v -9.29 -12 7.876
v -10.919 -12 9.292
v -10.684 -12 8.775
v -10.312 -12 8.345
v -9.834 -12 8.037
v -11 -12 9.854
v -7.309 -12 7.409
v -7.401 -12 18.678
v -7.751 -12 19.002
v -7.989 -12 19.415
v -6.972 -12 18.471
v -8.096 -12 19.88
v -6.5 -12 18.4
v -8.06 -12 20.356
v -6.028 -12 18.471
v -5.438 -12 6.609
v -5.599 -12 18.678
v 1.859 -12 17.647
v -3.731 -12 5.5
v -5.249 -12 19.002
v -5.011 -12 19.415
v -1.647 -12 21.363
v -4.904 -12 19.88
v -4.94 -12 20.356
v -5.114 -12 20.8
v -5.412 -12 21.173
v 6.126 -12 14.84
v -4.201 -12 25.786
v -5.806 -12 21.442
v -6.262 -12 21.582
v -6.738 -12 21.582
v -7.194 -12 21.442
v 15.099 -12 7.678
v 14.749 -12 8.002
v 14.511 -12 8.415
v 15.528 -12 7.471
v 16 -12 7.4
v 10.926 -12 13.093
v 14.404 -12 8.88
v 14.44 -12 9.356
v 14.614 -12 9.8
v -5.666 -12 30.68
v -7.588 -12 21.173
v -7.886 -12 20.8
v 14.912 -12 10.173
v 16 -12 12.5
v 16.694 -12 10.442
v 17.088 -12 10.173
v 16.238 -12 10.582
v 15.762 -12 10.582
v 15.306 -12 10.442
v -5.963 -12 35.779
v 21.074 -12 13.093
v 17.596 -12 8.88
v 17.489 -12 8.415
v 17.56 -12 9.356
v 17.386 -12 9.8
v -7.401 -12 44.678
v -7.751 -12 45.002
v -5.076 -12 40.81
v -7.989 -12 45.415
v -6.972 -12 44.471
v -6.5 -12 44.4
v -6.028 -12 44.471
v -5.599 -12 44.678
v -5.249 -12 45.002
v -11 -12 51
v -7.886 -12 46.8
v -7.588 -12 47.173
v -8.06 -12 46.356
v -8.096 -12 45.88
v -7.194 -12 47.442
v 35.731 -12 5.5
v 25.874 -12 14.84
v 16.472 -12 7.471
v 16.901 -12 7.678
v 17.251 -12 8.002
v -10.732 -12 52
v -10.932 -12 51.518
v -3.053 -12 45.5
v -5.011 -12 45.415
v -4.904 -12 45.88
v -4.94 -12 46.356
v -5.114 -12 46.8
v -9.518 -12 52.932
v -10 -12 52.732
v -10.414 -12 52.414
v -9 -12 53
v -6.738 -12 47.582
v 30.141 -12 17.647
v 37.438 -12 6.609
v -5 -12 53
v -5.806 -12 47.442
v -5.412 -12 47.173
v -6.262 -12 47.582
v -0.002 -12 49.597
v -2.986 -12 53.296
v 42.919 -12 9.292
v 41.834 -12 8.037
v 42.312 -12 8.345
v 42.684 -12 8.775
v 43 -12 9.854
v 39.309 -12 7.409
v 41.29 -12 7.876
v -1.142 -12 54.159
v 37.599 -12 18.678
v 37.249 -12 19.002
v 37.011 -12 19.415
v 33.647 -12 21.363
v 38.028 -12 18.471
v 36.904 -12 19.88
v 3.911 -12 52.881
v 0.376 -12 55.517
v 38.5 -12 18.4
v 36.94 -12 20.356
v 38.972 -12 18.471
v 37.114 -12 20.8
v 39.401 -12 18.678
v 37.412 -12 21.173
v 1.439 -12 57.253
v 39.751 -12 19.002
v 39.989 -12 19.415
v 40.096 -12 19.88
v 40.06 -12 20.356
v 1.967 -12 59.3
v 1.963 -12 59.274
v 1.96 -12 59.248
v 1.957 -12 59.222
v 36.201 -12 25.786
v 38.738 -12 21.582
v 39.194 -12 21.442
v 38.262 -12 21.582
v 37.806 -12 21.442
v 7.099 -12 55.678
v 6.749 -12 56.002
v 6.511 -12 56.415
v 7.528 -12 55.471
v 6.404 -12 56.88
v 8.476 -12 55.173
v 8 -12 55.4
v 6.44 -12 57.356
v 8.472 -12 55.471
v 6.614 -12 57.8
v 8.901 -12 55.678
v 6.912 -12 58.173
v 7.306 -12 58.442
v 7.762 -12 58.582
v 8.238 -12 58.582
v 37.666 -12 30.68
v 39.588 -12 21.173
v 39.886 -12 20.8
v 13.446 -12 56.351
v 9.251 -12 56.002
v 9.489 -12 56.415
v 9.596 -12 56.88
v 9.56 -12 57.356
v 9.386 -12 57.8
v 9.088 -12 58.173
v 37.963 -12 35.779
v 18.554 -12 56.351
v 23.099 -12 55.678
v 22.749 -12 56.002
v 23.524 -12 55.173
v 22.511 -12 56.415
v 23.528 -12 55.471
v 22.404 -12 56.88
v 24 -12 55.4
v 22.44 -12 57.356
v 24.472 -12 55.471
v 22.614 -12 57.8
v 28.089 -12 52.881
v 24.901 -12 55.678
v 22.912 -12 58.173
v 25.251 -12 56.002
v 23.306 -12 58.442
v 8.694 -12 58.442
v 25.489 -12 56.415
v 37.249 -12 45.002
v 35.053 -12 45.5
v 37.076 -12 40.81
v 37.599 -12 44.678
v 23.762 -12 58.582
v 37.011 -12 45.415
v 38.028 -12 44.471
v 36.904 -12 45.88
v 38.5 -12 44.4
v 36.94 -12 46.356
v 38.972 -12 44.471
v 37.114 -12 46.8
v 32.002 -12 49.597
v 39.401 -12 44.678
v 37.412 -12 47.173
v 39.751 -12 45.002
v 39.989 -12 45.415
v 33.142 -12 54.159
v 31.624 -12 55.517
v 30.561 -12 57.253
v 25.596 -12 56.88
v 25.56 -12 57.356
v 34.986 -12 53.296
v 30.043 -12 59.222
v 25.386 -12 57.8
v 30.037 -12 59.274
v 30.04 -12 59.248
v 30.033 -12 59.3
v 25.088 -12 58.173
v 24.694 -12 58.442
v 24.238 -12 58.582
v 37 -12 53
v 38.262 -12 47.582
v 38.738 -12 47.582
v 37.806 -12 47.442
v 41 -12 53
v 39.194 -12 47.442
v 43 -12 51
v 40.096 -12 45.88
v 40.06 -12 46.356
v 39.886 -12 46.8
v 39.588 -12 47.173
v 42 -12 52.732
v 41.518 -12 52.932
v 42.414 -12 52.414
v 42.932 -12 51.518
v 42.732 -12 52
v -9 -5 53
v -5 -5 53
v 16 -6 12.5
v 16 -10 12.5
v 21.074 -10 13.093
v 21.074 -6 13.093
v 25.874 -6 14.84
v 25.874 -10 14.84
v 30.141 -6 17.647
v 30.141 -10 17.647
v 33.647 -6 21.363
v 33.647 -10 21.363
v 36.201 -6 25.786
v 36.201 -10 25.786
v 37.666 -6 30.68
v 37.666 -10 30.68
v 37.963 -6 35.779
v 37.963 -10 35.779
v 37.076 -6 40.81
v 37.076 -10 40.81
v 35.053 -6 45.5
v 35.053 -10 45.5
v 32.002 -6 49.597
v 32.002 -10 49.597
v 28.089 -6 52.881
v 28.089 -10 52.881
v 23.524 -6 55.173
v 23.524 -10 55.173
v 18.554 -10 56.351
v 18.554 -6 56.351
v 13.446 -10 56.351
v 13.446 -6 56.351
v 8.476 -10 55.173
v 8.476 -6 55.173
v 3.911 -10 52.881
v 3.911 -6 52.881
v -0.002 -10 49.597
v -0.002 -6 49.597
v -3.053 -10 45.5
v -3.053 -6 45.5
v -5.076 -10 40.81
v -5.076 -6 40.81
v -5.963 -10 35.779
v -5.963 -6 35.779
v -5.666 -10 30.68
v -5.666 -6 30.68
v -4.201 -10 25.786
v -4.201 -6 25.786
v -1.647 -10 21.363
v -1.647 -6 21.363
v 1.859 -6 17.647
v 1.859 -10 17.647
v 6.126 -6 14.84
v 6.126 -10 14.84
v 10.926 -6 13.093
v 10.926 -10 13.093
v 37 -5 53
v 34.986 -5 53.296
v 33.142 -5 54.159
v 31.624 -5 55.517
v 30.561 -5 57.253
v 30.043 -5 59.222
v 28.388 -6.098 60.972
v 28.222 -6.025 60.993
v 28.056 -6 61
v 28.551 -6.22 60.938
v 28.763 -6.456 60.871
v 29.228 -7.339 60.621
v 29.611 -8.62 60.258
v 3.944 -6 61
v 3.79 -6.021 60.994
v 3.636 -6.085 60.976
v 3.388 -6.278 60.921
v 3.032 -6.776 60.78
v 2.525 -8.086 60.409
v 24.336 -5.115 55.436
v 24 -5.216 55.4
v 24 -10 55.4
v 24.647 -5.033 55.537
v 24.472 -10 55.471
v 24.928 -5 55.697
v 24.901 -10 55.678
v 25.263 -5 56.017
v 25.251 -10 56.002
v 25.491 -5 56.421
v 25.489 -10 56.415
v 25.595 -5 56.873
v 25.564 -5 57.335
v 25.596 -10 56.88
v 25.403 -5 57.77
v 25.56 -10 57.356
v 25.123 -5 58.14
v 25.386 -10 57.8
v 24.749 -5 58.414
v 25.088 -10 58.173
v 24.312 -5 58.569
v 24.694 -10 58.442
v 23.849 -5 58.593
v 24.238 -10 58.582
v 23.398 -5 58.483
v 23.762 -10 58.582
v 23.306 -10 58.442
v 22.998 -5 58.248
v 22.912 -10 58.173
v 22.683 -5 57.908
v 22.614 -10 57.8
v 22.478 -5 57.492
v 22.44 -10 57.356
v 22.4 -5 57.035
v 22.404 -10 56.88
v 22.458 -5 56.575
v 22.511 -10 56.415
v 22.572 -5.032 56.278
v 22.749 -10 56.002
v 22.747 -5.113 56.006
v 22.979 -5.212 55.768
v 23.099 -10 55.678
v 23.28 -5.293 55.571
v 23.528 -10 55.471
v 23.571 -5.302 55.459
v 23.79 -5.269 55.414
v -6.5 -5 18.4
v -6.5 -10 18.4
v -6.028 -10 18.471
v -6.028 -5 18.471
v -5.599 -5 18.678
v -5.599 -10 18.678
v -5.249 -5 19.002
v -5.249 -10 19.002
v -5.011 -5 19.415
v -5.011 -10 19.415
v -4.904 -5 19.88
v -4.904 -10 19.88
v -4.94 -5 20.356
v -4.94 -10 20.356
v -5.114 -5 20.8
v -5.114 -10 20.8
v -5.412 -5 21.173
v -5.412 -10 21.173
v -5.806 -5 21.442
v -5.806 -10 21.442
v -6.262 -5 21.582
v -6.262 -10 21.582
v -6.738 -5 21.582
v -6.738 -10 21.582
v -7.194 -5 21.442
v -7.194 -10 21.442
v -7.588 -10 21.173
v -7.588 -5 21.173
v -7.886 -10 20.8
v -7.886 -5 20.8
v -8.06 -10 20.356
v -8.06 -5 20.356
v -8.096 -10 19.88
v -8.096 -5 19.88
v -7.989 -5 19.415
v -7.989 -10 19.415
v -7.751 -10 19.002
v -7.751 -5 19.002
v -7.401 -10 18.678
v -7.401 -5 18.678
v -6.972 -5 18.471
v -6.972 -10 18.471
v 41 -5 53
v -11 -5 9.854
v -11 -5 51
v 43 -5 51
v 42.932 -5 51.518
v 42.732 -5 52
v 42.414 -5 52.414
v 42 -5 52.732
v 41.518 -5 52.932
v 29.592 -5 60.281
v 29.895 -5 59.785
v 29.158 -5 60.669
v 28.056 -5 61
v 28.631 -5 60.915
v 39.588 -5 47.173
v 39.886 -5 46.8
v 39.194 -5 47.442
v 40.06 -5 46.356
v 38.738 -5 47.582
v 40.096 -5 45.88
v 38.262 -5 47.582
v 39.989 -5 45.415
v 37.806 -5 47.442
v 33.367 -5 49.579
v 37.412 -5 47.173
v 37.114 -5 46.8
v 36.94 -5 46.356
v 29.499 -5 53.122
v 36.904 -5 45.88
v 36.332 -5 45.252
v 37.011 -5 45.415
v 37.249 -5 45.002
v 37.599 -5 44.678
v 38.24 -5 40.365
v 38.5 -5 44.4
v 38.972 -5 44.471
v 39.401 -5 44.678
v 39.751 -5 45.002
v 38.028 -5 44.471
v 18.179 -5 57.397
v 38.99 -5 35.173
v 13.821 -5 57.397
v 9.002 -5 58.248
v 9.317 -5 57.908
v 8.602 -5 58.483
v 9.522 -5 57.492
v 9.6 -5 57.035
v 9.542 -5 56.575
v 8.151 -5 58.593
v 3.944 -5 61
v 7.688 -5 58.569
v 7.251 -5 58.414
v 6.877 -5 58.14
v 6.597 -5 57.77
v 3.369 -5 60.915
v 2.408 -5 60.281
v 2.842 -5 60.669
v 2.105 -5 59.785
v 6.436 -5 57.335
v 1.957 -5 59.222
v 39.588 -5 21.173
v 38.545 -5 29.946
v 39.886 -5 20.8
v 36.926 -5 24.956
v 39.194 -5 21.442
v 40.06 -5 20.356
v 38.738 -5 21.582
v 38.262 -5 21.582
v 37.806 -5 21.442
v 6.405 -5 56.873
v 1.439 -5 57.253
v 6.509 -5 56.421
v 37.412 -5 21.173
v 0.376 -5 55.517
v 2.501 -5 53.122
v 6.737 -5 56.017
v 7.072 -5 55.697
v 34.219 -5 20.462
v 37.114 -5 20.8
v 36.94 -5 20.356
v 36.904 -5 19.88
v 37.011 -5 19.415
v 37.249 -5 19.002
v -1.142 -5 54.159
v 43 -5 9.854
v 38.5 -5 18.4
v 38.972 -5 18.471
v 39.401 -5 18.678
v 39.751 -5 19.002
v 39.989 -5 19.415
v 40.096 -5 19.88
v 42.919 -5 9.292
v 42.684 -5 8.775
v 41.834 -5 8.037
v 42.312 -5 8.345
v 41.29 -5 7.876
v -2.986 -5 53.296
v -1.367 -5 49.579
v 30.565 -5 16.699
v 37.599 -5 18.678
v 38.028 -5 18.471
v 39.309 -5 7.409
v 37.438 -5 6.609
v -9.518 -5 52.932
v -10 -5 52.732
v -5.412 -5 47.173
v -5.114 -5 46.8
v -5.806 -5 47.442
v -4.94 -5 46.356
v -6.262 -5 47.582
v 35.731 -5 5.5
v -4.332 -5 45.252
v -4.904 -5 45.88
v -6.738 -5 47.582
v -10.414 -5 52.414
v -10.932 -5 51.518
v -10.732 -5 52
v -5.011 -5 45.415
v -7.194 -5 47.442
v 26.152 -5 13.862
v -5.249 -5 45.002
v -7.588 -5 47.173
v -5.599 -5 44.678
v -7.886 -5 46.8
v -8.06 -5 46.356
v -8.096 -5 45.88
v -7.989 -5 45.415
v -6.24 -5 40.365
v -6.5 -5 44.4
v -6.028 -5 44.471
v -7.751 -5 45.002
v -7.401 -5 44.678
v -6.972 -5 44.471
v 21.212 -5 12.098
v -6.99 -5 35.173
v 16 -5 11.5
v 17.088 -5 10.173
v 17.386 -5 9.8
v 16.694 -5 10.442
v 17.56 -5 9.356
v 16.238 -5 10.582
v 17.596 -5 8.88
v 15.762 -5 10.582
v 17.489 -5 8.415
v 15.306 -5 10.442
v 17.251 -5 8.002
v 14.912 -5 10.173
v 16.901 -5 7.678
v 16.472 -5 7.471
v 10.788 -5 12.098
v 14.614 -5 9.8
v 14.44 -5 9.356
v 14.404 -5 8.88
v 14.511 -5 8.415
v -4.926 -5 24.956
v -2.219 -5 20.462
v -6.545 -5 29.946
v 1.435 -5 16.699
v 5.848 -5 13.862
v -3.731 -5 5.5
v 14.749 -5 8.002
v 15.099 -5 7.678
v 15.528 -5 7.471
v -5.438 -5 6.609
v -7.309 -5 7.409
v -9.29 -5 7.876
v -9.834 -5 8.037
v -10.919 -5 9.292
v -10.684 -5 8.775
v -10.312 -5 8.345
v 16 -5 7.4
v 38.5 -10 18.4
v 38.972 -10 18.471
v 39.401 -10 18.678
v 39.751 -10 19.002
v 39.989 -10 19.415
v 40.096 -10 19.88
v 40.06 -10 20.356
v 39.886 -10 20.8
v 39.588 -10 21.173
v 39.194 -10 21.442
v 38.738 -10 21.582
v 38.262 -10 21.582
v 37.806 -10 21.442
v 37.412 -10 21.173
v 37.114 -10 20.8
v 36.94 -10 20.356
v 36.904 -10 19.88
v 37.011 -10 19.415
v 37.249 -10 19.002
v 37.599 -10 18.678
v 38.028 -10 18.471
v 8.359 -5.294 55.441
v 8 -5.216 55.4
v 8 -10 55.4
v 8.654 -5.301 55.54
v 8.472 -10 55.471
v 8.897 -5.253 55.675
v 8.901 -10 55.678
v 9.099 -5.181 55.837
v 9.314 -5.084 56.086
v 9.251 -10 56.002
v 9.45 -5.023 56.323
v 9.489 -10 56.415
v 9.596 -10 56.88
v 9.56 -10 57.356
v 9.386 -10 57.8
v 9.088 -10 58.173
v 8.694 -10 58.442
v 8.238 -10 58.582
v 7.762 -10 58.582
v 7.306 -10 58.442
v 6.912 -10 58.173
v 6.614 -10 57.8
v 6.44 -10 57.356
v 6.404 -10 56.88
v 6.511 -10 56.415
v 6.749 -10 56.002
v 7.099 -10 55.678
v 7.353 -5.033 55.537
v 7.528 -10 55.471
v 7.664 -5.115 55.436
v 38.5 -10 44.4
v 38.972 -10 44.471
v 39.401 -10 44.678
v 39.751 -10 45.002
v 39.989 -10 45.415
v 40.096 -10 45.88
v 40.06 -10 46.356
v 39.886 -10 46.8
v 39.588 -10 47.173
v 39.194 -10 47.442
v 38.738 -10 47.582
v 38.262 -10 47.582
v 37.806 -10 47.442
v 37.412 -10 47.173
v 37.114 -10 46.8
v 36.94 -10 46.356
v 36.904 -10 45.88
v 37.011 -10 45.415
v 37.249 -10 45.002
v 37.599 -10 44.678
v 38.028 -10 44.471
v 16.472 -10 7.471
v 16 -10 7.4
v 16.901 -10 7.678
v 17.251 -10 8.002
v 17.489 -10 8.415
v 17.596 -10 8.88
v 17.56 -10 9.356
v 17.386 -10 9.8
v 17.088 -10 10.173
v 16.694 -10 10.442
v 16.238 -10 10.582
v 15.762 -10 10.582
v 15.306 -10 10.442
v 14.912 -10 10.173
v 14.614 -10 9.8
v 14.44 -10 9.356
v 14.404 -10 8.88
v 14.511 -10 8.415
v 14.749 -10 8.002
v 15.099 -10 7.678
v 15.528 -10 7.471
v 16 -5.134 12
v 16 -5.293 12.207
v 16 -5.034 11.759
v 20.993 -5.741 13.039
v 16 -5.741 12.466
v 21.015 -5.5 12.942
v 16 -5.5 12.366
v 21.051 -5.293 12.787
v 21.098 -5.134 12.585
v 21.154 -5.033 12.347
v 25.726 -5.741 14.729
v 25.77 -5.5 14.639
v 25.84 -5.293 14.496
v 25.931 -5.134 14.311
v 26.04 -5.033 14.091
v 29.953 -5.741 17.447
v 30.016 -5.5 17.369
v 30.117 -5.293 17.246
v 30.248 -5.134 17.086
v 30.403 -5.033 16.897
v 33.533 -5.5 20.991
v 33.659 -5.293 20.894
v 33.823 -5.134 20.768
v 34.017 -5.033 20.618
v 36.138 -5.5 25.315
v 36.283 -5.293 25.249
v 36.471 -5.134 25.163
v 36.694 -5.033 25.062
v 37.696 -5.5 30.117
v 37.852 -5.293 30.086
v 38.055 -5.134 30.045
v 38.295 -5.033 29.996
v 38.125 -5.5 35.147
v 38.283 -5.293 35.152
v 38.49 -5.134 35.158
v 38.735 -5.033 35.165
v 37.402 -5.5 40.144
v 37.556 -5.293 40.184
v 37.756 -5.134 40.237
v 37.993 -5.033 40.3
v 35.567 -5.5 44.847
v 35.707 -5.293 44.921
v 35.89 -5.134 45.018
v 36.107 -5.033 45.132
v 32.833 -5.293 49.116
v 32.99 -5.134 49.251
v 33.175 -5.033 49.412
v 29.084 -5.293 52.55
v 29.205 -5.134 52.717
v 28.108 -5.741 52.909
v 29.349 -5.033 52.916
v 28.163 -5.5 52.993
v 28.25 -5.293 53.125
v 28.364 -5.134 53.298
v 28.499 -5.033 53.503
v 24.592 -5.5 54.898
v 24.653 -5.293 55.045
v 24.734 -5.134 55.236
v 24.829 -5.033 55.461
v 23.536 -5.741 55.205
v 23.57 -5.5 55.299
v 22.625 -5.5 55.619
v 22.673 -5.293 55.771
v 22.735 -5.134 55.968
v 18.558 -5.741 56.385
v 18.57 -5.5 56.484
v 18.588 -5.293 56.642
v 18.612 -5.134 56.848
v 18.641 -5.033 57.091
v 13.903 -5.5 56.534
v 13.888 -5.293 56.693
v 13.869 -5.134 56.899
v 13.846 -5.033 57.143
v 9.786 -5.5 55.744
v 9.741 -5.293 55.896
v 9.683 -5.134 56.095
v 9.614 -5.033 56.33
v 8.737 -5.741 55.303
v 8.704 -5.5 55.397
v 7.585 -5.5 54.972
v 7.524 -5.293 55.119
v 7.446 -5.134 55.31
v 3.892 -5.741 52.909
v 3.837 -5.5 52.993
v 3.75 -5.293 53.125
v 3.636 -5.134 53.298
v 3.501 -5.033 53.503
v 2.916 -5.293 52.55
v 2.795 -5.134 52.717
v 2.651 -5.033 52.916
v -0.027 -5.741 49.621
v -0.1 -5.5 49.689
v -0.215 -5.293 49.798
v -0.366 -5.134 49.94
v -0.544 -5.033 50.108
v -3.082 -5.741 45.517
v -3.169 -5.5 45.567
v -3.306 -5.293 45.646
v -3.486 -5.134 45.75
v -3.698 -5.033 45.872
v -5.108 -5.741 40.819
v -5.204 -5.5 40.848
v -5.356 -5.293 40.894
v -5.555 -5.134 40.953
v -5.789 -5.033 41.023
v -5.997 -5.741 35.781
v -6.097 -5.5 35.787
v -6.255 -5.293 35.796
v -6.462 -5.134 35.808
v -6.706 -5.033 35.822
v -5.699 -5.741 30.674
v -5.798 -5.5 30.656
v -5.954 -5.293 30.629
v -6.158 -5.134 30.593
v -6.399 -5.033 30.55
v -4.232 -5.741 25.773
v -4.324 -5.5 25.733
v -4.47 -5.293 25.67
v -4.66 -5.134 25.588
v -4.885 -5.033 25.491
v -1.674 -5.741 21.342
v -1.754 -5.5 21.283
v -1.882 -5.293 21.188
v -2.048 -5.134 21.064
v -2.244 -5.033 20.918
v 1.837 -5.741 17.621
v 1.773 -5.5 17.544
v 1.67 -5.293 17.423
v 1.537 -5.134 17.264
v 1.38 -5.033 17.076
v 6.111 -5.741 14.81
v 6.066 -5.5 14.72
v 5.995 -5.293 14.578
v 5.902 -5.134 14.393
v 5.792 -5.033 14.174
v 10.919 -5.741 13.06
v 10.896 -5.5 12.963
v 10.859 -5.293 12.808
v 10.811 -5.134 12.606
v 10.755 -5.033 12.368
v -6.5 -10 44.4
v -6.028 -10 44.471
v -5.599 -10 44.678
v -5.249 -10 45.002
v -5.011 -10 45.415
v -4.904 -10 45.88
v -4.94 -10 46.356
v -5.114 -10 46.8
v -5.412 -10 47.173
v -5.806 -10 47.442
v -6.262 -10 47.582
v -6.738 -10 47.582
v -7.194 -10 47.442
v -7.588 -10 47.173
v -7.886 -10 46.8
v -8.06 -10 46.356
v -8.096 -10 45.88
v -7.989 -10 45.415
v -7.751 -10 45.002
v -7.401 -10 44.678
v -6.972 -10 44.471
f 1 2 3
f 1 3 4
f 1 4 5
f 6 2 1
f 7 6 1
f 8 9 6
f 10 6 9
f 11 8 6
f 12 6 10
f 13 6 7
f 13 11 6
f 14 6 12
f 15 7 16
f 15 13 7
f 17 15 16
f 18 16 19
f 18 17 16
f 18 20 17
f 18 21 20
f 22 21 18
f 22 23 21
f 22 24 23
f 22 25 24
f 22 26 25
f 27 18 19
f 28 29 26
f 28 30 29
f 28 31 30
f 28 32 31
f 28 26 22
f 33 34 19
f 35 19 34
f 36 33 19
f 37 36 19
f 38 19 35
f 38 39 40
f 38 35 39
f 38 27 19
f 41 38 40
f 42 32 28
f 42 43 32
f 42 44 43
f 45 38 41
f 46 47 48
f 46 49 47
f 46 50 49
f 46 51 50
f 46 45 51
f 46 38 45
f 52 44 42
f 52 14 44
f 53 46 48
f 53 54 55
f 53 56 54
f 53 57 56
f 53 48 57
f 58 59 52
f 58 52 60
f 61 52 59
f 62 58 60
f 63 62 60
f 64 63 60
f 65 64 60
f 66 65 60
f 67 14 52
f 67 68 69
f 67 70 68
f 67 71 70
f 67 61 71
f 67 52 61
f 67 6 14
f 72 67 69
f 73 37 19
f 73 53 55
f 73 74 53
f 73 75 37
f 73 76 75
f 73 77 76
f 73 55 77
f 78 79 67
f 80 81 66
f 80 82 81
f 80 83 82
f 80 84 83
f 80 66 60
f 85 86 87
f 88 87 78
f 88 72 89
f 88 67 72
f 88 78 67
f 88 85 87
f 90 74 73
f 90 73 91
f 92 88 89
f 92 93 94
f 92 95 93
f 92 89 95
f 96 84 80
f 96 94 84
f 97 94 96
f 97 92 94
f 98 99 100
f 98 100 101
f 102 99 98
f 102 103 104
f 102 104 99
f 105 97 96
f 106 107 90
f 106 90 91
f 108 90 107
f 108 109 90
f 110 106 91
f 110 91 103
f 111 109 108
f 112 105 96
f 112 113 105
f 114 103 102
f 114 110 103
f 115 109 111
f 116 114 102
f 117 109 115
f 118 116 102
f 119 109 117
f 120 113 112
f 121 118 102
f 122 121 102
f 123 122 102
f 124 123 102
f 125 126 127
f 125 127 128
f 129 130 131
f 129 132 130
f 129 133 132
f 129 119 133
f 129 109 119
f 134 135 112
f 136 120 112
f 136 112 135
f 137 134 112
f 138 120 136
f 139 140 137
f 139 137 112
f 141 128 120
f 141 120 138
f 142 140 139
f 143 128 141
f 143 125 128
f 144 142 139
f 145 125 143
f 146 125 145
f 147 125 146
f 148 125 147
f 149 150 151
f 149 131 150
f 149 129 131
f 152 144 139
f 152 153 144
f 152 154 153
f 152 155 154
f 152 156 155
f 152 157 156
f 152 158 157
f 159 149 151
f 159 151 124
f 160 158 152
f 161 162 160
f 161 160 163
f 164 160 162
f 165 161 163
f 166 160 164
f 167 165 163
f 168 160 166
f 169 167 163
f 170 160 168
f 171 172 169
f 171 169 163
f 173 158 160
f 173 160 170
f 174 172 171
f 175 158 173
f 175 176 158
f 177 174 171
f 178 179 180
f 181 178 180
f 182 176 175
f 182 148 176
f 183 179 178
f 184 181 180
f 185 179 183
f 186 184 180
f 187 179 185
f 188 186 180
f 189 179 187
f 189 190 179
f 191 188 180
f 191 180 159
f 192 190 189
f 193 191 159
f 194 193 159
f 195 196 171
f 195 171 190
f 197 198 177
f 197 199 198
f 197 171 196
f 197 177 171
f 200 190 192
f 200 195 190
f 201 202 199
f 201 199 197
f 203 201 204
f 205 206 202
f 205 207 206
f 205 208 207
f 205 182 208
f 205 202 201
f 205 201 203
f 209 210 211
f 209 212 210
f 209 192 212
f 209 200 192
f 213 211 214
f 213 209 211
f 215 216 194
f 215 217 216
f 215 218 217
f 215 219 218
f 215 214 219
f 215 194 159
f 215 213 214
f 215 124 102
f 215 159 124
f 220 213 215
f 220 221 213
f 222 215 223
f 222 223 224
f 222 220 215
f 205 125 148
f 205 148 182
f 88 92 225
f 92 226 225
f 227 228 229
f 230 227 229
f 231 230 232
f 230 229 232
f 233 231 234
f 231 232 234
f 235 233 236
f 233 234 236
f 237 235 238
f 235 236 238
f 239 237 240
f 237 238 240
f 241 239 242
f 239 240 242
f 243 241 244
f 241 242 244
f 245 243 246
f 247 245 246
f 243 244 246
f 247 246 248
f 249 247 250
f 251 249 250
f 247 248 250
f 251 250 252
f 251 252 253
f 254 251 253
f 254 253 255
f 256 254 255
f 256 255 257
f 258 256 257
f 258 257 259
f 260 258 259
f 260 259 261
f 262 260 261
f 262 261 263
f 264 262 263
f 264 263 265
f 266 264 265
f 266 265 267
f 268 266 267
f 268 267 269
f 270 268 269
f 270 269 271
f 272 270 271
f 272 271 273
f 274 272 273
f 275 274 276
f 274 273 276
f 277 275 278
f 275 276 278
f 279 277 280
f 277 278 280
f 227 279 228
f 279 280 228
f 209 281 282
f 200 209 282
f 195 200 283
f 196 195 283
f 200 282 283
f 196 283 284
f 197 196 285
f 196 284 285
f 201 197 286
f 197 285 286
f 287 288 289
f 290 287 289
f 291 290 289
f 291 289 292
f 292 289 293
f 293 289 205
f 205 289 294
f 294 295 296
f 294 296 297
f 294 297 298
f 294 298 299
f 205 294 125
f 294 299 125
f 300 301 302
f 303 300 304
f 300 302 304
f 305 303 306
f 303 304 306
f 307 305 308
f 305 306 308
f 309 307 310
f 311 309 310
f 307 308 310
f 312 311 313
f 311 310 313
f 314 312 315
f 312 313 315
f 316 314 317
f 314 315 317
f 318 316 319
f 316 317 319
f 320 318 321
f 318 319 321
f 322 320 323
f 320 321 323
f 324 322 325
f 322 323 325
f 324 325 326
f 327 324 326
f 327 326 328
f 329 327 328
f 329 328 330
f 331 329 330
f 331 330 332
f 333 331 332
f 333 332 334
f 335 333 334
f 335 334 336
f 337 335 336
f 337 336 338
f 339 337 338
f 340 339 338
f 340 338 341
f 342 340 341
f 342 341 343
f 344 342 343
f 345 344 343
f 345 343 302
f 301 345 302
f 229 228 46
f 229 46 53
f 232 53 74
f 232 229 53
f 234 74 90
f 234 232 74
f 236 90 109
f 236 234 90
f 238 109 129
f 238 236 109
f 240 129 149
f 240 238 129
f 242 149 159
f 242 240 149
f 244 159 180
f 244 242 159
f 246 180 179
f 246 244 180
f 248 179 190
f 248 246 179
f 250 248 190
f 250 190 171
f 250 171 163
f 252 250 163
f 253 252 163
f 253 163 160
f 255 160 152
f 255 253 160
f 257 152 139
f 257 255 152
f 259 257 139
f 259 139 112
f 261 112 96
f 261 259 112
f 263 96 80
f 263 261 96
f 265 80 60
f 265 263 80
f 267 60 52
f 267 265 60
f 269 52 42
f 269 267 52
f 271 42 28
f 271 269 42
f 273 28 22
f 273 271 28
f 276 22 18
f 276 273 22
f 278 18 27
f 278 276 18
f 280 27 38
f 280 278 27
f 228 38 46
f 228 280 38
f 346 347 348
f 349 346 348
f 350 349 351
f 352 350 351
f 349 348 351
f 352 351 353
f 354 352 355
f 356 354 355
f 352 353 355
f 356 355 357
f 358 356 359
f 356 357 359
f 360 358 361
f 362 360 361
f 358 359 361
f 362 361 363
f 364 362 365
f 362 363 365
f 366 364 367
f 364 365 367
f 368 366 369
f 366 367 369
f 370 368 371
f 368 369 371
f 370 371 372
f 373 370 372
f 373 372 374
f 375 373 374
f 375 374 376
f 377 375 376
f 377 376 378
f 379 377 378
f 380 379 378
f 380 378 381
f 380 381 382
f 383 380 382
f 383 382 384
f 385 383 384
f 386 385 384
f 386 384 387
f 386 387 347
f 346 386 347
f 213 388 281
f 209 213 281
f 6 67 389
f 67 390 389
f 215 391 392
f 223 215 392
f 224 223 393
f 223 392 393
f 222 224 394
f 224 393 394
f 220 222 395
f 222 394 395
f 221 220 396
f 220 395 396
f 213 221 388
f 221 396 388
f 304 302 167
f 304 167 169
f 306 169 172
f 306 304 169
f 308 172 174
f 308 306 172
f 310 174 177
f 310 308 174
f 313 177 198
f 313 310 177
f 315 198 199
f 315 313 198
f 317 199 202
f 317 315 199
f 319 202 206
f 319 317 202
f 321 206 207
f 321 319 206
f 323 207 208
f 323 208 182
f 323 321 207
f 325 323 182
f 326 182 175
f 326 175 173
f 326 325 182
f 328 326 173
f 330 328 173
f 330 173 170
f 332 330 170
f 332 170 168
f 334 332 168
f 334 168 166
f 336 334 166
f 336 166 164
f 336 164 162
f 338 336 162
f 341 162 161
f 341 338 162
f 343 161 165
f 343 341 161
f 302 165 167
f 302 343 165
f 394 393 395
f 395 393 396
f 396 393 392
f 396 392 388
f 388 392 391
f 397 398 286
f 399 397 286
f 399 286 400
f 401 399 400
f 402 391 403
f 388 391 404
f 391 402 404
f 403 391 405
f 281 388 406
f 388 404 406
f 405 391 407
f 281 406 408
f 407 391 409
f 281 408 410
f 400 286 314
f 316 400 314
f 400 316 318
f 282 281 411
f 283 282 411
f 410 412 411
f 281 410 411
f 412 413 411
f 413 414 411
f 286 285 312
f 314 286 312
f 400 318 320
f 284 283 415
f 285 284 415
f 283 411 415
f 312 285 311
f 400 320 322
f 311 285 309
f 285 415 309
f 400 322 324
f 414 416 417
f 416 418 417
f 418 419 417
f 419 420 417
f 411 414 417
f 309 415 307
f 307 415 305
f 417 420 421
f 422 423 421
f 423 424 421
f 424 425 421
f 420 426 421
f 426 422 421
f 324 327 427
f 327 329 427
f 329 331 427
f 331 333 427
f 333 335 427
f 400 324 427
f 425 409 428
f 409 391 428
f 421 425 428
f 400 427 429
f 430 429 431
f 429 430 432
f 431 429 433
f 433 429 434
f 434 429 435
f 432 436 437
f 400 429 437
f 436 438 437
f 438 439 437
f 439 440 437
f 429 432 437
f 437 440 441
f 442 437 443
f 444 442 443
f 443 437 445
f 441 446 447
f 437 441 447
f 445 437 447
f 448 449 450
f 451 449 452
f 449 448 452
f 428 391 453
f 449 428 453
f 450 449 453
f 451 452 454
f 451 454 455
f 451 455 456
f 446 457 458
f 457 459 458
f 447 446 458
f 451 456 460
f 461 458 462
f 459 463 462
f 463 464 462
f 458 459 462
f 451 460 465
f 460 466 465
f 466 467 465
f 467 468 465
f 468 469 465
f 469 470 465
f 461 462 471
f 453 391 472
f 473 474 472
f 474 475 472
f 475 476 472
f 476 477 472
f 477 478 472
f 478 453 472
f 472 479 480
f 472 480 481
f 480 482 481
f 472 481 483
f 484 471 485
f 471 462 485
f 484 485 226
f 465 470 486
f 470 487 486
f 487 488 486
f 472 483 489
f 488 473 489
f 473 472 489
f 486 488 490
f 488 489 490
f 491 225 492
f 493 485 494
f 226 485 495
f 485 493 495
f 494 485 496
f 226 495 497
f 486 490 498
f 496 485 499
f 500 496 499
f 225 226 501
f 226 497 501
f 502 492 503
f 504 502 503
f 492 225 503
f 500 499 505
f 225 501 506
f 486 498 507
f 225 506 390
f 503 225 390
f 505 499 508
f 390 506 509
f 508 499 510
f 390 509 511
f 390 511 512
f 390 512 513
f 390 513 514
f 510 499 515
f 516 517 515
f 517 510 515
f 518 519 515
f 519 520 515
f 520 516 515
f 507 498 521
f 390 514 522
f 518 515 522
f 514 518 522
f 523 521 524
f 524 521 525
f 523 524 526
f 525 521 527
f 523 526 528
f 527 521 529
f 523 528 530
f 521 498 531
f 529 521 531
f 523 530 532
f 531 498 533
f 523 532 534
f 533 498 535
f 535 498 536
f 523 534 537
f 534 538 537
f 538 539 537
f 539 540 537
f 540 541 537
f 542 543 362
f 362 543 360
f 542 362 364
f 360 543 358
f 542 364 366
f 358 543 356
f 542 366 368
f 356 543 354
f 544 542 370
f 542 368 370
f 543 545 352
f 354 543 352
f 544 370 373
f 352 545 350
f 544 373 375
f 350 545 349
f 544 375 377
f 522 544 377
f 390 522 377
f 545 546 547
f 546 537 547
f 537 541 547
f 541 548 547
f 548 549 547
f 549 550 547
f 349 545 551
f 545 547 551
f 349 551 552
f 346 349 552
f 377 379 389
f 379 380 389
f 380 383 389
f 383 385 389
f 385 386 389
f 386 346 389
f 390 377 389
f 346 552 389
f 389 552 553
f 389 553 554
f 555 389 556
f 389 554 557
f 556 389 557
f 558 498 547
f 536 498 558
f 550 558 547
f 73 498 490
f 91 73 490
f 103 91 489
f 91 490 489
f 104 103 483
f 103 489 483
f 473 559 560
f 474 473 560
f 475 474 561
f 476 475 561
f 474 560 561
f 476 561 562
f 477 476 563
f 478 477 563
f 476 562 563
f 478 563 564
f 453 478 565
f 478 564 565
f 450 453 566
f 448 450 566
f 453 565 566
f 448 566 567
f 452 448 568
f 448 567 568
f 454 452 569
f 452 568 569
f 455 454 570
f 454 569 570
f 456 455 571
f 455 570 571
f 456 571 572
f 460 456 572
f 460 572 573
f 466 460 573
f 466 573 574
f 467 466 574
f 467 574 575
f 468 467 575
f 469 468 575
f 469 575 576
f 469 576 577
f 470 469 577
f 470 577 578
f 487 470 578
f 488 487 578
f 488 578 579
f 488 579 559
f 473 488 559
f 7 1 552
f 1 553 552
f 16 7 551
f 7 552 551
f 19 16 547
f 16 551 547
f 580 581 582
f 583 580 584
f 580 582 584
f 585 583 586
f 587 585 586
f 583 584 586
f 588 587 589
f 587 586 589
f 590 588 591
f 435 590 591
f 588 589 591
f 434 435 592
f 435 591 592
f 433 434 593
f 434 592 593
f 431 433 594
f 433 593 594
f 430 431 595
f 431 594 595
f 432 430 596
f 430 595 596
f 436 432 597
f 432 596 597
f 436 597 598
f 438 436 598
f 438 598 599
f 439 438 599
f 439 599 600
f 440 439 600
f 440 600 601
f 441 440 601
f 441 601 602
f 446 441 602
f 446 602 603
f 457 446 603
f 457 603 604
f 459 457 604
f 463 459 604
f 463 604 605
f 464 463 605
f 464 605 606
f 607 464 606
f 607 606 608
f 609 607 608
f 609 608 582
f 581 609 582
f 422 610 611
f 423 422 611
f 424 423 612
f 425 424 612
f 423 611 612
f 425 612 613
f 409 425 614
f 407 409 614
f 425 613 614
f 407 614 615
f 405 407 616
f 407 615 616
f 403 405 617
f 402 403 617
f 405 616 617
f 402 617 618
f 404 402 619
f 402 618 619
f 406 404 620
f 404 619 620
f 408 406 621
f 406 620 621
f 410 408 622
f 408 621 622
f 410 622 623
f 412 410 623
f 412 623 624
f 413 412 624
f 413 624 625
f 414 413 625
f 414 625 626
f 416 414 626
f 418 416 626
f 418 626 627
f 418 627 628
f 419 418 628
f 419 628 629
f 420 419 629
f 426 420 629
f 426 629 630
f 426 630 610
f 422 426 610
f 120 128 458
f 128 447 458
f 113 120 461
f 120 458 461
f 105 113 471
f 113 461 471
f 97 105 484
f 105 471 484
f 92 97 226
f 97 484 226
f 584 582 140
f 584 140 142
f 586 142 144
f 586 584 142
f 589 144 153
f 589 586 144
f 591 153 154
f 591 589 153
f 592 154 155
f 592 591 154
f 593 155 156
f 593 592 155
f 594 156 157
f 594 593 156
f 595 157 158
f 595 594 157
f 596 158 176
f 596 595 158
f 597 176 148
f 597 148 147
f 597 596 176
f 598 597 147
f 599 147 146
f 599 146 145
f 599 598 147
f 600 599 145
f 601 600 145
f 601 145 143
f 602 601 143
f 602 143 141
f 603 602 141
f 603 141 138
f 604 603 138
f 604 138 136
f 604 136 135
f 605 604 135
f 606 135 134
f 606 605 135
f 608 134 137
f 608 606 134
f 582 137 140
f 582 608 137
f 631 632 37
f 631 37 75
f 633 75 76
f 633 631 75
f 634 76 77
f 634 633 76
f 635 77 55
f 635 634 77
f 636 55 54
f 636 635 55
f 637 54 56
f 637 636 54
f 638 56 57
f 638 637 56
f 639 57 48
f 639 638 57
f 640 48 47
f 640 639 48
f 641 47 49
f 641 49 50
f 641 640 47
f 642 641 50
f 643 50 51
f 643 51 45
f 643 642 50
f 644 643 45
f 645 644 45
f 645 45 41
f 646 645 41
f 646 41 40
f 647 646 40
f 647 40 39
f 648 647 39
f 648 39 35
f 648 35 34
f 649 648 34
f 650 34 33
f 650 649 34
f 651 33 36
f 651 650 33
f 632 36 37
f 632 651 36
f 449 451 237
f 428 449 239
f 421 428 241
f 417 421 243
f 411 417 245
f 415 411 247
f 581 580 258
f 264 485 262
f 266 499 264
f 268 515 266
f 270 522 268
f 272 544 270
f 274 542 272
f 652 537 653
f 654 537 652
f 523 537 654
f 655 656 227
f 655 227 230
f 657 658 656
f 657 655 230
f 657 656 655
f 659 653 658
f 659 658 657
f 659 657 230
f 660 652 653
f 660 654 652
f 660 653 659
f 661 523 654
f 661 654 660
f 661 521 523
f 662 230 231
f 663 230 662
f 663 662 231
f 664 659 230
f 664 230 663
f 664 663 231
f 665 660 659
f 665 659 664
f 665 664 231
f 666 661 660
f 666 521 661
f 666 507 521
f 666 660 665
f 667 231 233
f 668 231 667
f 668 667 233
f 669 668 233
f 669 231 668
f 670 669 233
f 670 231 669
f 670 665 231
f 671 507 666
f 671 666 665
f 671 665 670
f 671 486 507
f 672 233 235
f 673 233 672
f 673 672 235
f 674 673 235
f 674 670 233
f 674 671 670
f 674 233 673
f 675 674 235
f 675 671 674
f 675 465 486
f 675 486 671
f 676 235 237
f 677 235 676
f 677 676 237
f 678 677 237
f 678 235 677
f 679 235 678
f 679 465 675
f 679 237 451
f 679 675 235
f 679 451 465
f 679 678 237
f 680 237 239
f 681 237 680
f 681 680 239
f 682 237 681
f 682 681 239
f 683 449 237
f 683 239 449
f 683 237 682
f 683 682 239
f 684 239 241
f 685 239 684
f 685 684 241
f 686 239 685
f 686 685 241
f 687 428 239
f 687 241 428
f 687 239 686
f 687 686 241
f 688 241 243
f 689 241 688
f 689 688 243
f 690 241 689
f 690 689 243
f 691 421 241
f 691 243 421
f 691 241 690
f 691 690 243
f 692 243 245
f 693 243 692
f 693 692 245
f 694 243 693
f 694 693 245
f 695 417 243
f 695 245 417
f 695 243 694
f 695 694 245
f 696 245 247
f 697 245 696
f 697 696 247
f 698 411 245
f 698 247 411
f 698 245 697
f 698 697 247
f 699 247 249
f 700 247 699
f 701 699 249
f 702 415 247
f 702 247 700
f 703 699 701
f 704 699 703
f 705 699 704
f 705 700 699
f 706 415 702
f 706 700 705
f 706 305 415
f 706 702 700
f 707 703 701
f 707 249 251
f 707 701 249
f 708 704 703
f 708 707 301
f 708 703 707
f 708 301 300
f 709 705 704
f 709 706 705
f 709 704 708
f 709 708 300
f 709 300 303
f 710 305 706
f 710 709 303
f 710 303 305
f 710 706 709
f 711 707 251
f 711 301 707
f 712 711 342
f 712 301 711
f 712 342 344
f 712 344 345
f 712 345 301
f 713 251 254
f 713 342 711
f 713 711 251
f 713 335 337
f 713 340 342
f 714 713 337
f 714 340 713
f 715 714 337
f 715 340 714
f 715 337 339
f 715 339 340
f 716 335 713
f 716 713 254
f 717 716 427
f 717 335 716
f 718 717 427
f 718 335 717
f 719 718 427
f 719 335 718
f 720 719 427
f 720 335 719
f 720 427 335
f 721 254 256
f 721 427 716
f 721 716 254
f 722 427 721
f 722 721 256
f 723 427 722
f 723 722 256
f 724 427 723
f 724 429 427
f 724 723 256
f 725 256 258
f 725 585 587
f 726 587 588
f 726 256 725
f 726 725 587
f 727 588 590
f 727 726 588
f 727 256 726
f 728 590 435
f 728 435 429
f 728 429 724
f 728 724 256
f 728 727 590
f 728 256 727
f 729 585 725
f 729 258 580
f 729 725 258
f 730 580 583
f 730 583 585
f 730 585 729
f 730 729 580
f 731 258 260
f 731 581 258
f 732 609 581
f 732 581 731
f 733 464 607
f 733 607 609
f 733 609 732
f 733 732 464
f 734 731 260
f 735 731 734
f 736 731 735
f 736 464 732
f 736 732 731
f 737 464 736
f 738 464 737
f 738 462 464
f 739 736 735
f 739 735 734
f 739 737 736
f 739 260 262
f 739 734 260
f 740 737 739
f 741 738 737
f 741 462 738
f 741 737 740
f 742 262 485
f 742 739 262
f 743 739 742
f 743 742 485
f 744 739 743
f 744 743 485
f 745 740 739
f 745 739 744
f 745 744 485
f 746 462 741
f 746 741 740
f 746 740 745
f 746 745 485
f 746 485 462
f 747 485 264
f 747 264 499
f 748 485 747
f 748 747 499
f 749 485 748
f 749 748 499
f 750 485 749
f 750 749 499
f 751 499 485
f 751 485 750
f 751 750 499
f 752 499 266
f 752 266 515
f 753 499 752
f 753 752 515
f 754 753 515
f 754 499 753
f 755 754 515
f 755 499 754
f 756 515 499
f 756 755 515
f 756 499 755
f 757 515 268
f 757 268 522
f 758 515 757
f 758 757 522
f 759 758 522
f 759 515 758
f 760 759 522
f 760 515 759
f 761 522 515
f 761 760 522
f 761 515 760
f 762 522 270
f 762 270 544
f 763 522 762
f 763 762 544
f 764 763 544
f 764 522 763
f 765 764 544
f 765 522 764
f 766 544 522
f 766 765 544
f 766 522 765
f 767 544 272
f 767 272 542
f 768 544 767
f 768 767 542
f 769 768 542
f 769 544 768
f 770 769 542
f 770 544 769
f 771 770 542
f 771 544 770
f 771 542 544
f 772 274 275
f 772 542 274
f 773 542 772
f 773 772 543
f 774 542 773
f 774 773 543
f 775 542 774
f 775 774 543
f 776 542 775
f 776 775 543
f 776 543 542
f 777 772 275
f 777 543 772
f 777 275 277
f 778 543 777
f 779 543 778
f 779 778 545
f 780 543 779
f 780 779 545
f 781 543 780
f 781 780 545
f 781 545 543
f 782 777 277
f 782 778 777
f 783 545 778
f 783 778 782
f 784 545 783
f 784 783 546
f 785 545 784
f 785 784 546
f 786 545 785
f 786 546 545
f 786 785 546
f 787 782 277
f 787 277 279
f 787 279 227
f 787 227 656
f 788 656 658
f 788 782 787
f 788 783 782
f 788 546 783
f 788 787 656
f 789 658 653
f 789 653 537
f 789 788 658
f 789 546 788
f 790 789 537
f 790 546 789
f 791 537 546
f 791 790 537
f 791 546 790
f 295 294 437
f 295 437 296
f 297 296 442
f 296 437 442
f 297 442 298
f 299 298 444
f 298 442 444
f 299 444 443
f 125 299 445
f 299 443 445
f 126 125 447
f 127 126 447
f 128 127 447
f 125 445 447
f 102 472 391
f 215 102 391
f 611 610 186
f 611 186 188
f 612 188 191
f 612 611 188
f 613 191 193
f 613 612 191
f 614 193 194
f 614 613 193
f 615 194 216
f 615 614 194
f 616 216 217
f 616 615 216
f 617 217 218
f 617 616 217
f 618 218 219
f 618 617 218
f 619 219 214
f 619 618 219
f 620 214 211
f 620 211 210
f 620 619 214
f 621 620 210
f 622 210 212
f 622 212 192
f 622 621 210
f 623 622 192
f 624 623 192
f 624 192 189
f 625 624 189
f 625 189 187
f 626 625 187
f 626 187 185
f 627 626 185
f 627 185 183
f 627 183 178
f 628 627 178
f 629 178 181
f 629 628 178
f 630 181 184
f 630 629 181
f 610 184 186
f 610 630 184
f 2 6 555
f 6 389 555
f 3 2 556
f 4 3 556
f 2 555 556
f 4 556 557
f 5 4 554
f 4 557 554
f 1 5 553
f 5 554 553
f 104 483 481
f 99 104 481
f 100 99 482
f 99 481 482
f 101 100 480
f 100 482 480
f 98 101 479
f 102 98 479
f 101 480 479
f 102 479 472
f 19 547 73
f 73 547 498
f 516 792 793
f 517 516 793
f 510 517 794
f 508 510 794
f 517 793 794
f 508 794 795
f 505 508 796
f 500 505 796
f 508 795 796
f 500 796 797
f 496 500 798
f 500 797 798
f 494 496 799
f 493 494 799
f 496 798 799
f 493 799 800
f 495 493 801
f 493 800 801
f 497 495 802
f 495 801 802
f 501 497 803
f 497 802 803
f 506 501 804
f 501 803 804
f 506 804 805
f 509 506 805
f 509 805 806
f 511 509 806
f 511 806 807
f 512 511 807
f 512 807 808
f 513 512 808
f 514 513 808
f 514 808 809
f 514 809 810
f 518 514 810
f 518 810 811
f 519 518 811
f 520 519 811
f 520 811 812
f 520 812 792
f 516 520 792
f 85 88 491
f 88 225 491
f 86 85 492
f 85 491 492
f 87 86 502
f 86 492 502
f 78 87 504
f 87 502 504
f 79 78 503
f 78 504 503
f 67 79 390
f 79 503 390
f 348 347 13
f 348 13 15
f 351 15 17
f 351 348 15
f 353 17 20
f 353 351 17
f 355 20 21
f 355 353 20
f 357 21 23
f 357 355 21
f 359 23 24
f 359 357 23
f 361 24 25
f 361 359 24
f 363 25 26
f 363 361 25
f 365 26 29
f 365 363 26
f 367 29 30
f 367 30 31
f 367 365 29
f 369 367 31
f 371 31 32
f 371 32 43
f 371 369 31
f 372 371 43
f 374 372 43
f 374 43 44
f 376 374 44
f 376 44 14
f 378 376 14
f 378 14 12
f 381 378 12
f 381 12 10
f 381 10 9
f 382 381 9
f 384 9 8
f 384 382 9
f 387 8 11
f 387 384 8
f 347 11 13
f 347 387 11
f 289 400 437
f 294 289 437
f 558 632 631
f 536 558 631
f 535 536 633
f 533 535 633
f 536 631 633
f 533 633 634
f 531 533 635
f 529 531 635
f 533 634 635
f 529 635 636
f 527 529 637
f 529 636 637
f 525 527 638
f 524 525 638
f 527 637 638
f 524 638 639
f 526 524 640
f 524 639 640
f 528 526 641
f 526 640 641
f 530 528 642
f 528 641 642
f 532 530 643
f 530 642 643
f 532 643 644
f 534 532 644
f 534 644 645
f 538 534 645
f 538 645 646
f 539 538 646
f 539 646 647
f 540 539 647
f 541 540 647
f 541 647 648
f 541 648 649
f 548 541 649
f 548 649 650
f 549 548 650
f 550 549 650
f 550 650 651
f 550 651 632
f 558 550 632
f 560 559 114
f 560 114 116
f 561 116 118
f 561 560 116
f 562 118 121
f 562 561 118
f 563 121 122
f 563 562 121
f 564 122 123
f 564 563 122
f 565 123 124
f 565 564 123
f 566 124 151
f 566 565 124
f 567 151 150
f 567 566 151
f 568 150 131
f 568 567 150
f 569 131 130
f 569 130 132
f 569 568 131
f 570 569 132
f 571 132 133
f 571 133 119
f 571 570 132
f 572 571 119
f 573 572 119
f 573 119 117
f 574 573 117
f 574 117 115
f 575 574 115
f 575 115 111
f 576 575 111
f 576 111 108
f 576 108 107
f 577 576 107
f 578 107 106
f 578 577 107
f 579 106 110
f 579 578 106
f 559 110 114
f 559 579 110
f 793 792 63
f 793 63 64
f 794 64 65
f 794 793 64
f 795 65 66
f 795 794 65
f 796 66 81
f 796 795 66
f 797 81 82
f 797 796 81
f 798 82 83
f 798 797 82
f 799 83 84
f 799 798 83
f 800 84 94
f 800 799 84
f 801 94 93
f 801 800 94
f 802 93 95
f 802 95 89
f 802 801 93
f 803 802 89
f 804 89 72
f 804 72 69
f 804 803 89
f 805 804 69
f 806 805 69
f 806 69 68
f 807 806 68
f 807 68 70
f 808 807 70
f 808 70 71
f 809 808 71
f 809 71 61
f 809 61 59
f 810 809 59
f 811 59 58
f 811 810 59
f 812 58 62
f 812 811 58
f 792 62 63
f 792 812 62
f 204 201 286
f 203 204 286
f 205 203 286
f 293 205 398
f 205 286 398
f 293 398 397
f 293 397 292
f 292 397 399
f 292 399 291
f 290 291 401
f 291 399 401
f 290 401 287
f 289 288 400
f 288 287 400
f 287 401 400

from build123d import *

# Parameters (mm, degrees)
EXTRUDE_1_DEPTH          = 5
SKETCH_3_R               = 22
CUT_EXTRUDE_1_DEPTH      = 75.79973262
SKETCH_4_R               = 1.6
CUT_EXTRUDE_3_DEPTH      = 75.79973262
SKETCH_9_R               = 1.6
SKETCH_9_R_2             = 22
EXTRUDE_2_DEPTH          = 2
FILLET_1_R               = 1
CUT_EXTRUDE_4_DEPTH      = 68.779052811
CUT_EXTRUDE_4_DEPTH_BACK = 68.779052811


with BuildPart() as part:
    # Эскиз2 → Бобышка-Вытянуть1 (new body)
    with BuildSketch(Plane(origin=(0, -5, 0), x_dir=(-1, 0, 0), z_dir=(0, -1, 0))):
        with BuildLine():
            Line((-28.05572809, -61), (-3.94427191, -61))
            ThreePointArc((-3.94427191, -61), (-2.610938577, -60.490711985), (-1.95665593, -59.222222222))
            ThreePointArc((-1.95665593, -59.222222222), (0.333333333, -54.782508053), (5, -53))
            Line((5, -53), (9, -53))
            ThreePointArc((9, -53), (10.414213562, -52.414213562), (11, -51))
            Line((11, -51), (11, -9.854480973))
            ThreePointArc((11, -9.854480973), (10.513111175, -8.546622199), (9.289505428, -7.875545247))
            ThreePointArc((9.289505428, -7.875545247), (6.355962769, -7.049175653), (3.731345838, -5.5))
            Line((3.731345838, -5.5), (-35.731345838, -5.5))
            ThreePointArc((-35.731345838, -5.5), (-38.355962769, -7.049175653), (-41.289505428, -7.875545247))
            ThreePointArc((-41.289505428, -7.875545247), (-42.513111175, -8.546622199), (-43, -9.854480973))
            Line((-43, -9.854480973), (-43, -51))
            ThreePointArc((-43, -51), (-42.414213562, -52.414213562), (-41, -53))
            Line((-41, -53), (-37, -53))
            ThreePointArc((-37, -53), (-32.333333333, -54.782508053), (-30.04334407, -59.222222222))
            ThreePointArc((-30.04334407, -59.222222222), (-29.389061423, -60.490711985), (-28.05572809, -61))
        make_face()
    extrude(amount=EXTRUDE_1_DEPTH)

    # Эскиз3 → Вырез-Вытянуть1 (cut, through all)
    with BuildSketch(Plane.XZ.offset(10)):
        with Locations(Location((16, 34.5, 0), (0, 0, 270))):
            Circle(SKETCH_3_R)
    extrude(amount=-CUT_EXTRUDE_1_DEPTH, mode=Mode.SUBTRACT)

    # Эскиз4 → Вырез-Вытянуть3 (cut, through all)
    with BuildSketch(Plane.XZ.offset(10)):
        with Locations(Location((38.5, 20, 0), (0, 0, 270))):
            Circle(SKETCH_4_R)
        with Locations(Location((-6.5, 20, 0), (0, 0, 270))):
            Circle(SKETCH_4_R)
        with Locations(Location((-6.5, 46, 0), (0, 0, 270))):
            Circle(SKETCH_4_R)
        with Locations(Location((38.5, 46, 0), (0, 0, 270))):
            Circle(SKETCH_4_R)
        with Locations(Location((24, 57, 0), (0, 0, 270))):
            Circle(SKETCH_4_R)
        with Locations(Location((8, 57, 0), (0, 0, 270))):
            Circle(SKETCH_4_R)
        with Locations(Location((16, 9, 0), (0, 0, 270))):
            Circle(SKETCH_4_R)
    extrude(amount=-CUT_EXTRUDE_3_DEPTH, mode=Mode.SUBTRACT)

    # Эскиз9 → Бобышка-Вытянуть2 (add)
    with BuildSketch(Plane.XZ.offset(10)):
        with BuildLine():
            Line((28.05572809, 61), (3.94427191, 61))
            ThreePointArc((3.94427191, 61), (2.610938577, 60.490711985), (1.95665593, 59.222222222))
            ThreePointArc((1.95665593, 59.222222222), (-0.333333333, 54.782508053), (-5, 53))
            Line((-5, 53), (-9, 53))
            ThreePointArc((-9, 53), (-10.414213562, 52.414213562), (-11, 51))
            Line((-11, 51), (-11, 9.854480973))
            ThreePointArc((-11, 9.854480973), (-10.513111175, 8.546622199), (-9.289505428, 7.875545247))
            ThreePointArc((-9.289505428, 7.875545247), (-6.355962769, 7.049175653), (-3.731345838, 5.5))
            Line((-3.731345838, 5.5), (35.731345838, 5.5))
            ThreePointArc((35.731345838, 5.5), (38.355962769, 7.049175653), (41.289505428, 7.875545247))
            ThreePointArc((41.289505428, 7.875545247), (42.513111175, 8.546622199), (43, 9.854480973))
            Line((43, 9.854480973), (43, 51))
            ThreePointArc((43, 51), (42.414213562, 52.414213562), (41, 53))
            Line((41, 53), (37, 53))
            ThreePointArc((37, 53), (32.333333333, 54.782508053), (30.04334407, 59.222222222))
            ThreePointArc((30.04334407, 59.222222222), (29.389061423, 60.490711985), (28.05572809, 61))
        make_face()
        with Locations(Location((38.5, 46, 0), (0, 0, 270))):
            Circle(SKETCH_9_R, mode=Mode.SUBTRACT)
        with Locations(Location((24, 57, 0), (0, 0, 270))):
            Circle(SKETCH_9_R, mode=Mode.SUBTRACT)
        with Locations(Location((38.5, 20, 0), (0, 0, 270))):
            Circle(SKETCH_9_R, mode=Mode.SUBTRACT)
        with Locations(Location((16, 9, 0), (0, 0, 270))):
            Circle(SKETCH_9_R, mode=Mode.SUBTRACT)
        with Locations(Location((-6.5, 20, 0), (0, 0, 270))):
            Circle(SKETCH_9_R, mode=Mode.SUBTRACT)
        with Locations(Location((-6.5, 46, 0), (0, 0, 270))):
            Circle(SKETCH_9_R, mode=Mode.SUBTRACT)
        with Locations(Location((8, 57, 0), (0, 0, 270))):
            Circle(SKETCH_9_R, mode=Mode.SUBTRACT)
        with Locations(Location((16, 34.5, 0), (0, 0, 270))):
            Circle(SKETCH_9_R_2, mode=Mode.SUBTRACT)
    extrude(amount=EXTRUDE_2_DEPTH)

    # Скругление1
    # the kernel refuses this fillet: 1 mm, written as the material it takes off along each edge
    with BuildSketch(Plane(origin=(16, -5, 34.5), x_dir=(0, 0, -1), z_dir=(-1, 0, 0))) as fillet_1_piece_1:
        with BuildLine():
            CenterArc((22 + FILLET_1_R, FILLET_1_R), FILLET_1_R, 180, 90)
            Line((22, FILLET_1_R), (22, 0))
            Line((22, 0), (22 + FILLET_1_R, 0))
        make_face()
    revolve(axis=Axis((16, -5, 34.5), (0, -1, 0)), mode=Mode.SUBTRACT)

    # Эскиз12 → Вырез-Вытянуть4 (cut, two sides: drawn at the far end of the back side and taken through both)
    with BuildSketch(Plane(origin=(16, 0, 0), x_dir=(0, 0, 1), z_dir=(1, 0, 0)).offset(-CUT_EXTRUDE_4_DEPTH_BACK)):
        Polygon((61, 12), (61, 6), (59.3, 12), align=None)
    extrude(amount=CUT_EXTRUDE_4_DEPTH + CUT_EXTRUDE_4_DEPTH_BACK, mode=Mode.SUBTRACT)


solid = part.part
